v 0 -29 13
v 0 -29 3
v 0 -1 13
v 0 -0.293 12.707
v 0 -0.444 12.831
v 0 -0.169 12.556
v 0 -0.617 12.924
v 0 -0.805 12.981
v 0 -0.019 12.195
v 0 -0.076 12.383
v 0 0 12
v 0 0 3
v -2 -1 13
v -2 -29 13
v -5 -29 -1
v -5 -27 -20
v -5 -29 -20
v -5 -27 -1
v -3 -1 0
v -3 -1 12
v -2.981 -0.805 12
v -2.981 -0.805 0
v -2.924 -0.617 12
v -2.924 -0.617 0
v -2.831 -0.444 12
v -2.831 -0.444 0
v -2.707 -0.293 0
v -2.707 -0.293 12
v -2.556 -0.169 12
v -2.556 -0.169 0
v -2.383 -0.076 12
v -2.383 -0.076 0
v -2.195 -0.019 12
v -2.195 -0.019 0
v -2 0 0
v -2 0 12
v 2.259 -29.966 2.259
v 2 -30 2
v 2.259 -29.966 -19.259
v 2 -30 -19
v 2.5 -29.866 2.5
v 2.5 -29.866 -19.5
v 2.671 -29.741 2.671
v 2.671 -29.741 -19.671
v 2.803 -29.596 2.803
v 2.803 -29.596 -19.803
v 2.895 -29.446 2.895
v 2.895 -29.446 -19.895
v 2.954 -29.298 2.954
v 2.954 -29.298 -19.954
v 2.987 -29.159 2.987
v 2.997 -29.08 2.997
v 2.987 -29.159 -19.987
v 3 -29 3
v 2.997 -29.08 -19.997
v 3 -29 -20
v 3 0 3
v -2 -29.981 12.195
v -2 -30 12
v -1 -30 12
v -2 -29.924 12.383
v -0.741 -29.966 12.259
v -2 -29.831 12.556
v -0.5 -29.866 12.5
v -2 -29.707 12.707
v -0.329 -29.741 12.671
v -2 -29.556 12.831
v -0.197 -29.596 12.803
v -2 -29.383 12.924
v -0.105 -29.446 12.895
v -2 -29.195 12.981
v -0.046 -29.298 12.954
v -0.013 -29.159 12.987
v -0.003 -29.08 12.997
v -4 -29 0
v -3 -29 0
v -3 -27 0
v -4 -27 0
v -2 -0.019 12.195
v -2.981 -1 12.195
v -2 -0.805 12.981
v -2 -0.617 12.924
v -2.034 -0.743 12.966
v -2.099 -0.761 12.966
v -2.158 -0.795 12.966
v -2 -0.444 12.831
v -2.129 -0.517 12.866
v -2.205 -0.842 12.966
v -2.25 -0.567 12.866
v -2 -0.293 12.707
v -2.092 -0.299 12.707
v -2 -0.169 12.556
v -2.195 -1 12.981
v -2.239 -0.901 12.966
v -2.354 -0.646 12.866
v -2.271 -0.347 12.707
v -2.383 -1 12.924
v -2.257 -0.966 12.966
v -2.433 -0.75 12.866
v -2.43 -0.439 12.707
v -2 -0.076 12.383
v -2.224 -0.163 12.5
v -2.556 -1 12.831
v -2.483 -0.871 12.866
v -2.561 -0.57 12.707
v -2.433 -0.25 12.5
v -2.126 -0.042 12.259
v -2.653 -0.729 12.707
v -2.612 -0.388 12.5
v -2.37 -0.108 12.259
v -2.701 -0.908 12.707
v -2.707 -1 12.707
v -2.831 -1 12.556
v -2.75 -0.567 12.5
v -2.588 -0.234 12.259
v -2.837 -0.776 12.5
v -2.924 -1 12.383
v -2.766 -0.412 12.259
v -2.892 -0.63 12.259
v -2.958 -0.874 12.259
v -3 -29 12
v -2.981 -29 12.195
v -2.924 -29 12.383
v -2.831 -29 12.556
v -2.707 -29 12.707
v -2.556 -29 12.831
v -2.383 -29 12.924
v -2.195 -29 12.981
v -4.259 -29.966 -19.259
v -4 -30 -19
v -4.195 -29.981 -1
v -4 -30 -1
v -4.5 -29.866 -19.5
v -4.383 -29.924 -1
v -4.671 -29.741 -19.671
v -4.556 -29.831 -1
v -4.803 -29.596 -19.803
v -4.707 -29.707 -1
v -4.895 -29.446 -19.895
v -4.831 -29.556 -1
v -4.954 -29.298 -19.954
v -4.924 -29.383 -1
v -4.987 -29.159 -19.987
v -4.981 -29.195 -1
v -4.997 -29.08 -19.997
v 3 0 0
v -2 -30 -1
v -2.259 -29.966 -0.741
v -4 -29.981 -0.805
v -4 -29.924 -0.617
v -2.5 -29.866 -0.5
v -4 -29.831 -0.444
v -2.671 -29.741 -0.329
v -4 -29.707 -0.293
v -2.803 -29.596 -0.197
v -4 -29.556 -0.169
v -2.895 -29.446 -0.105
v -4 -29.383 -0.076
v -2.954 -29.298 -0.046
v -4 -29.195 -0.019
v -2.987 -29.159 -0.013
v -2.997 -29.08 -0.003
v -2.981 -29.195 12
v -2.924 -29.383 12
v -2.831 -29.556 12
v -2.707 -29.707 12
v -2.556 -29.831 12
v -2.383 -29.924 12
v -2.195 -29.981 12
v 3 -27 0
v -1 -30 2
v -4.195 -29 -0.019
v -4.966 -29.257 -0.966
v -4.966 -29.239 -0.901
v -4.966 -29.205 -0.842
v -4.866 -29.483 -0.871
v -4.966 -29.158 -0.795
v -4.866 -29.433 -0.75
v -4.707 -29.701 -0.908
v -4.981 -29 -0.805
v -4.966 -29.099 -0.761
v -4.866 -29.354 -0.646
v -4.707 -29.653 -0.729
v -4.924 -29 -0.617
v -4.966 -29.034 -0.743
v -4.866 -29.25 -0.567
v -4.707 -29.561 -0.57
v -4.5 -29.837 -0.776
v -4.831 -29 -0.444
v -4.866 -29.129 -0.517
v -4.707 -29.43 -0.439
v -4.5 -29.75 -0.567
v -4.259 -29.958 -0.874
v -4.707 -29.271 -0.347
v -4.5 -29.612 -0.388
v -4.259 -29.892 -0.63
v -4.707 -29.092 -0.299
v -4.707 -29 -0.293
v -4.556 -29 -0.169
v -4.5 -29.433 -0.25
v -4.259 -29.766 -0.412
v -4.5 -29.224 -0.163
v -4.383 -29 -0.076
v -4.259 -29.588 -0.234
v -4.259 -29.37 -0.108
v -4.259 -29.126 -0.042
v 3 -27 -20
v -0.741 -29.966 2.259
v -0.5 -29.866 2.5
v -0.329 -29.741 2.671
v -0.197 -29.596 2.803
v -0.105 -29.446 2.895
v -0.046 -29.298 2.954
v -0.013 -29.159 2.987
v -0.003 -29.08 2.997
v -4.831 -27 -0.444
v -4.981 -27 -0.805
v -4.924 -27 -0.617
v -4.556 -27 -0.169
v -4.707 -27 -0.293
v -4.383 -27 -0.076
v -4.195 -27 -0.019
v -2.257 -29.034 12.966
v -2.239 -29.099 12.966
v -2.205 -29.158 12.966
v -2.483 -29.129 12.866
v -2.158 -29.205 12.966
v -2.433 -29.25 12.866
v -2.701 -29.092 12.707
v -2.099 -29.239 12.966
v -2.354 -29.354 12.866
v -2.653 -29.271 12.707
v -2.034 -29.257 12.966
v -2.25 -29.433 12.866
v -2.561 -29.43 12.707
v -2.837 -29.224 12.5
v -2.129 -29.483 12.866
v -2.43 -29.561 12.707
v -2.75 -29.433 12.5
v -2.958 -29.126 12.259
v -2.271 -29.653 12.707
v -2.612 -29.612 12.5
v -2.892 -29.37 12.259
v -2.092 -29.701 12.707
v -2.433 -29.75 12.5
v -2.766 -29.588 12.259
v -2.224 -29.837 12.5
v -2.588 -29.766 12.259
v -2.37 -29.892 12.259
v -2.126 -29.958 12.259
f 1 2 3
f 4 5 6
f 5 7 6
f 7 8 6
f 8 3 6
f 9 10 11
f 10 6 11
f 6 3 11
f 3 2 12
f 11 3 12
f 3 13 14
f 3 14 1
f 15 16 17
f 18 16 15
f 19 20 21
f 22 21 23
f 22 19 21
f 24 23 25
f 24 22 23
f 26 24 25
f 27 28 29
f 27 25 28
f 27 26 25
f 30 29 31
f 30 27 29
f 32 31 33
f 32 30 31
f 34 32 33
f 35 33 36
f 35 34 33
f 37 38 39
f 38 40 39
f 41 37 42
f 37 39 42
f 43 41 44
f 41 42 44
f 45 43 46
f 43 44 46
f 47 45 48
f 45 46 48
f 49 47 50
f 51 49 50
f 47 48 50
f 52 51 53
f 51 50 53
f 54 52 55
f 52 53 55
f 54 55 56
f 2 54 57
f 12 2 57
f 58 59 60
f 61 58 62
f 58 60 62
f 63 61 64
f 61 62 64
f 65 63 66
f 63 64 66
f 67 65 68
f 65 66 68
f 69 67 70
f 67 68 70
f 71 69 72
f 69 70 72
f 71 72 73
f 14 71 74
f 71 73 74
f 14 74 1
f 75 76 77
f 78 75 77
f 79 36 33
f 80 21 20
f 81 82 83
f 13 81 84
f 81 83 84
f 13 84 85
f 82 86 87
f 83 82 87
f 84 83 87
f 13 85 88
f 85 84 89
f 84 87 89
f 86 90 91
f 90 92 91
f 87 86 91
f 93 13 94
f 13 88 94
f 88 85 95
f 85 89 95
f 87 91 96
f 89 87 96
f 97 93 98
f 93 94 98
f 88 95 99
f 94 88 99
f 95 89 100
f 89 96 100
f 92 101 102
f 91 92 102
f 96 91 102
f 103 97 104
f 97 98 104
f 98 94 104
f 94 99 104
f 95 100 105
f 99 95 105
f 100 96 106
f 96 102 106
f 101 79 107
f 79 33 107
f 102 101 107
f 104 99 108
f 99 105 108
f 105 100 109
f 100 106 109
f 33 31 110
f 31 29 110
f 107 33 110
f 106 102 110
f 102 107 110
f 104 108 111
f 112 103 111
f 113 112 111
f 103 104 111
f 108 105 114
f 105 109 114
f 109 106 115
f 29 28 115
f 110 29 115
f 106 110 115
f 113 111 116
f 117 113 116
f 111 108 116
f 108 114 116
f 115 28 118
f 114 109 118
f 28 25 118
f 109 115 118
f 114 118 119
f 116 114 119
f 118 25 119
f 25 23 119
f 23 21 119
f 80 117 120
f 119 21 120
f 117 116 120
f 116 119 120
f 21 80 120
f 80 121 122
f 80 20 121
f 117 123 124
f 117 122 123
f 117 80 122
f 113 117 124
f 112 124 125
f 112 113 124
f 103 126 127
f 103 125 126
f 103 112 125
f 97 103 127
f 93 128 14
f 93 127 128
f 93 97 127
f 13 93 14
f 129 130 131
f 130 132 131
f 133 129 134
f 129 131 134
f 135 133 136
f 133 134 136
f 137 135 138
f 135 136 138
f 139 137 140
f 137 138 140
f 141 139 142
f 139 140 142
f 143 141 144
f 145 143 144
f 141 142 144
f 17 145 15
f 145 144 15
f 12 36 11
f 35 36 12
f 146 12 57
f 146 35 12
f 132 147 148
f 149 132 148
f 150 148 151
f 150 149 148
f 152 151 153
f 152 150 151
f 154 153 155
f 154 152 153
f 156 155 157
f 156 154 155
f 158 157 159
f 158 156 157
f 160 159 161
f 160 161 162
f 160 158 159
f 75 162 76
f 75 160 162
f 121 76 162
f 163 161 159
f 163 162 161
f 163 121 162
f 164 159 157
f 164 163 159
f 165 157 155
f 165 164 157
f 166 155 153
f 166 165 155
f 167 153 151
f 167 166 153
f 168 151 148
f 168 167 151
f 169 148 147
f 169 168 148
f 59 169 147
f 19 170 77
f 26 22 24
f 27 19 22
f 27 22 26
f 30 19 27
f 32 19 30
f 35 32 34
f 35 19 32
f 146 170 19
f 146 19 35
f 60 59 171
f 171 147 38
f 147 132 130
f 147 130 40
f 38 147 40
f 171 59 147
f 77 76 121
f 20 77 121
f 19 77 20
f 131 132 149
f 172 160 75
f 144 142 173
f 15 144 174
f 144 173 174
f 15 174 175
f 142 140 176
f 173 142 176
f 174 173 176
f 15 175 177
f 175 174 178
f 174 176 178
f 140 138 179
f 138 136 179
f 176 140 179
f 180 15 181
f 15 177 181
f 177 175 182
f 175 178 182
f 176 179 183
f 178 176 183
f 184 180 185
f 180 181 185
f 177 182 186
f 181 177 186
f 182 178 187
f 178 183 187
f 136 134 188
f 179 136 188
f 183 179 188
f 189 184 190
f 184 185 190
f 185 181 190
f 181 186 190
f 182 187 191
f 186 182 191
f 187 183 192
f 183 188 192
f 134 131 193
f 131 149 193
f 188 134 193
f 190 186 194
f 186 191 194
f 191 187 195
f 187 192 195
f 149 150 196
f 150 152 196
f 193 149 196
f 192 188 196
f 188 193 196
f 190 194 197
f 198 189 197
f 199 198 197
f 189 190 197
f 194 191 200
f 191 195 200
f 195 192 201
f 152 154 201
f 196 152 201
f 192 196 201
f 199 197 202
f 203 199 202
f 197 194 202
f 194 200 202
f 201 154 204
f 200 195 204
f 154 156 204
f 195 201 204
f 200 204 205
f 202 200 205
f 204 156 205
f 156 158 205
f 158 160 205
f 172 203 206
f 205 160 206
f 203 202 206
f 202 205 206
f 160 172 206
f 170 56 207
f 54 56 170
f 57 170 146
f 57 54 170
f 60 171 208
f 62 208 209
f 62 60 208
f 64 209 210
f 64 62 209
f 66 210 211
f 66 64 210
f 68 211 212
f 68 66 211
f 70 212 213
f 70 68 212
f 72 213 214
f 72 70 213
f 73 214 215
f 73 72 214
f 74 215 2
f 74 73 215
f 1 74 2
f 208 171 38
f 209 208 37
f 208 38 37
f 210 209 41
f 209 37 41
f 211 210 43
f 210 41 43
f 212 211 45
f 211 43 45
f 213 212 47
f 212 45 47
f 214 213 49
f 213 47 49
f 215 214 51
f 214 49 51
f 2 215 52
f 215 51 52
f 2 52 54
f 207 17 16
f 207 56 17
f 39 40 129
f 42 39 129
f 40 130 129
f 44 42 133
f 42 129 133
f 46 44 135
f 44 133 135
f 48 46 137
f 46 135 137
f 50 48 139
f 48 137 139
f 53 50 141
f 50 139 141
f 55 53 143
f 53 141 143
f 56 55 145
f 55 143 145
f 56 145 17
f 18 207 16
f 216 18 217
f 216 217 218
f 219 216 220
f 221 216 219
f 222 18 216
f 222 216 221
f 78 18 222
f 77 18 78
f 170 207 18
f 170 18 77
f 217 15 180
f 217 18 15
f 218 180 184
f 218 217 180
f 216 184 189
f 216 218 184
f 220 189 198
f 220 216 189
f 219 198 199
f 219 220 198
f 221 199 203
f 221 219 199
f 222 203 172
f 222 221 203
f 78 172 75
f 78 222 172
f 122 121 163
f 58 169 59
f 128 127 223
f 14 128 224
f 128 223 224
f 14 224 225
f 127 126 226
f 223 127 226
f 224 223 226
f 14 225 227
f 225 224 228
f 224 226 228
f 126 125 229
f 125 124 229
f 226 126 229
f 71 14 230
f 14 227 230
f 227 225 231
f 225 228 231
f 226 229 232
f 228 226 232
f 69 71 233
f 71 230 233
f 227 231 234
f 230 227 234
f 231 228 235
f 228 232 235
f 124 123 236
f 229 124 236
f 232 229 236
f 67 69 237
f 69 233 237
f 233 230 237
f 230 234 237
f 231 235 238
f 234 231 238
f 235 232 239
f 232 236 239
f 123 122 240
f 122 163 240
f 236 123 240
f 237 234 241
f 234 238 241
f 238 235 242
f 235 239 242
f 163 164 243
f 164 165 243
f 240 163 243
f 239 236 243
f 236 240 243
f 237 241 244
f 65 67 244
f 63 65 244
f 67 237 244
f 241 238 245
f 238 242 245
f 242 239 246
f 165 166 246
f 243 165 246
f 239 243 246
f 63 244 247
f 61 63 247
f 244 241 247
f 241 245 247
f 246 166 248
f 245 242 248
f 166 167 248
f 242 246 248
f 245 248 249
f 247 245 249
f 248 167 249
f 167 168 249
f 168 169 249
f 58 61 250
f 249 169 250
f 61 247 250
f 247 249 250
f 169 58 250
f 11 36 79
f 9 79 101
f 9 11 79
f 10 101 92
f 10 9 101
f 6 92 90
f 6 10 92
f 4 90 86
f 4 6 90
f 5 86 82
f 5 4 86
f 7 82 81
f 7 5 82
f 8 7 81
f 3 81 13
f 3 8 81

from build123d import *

# Parameters (mm, degrees)
SKETCH1_W            = 3
SKETCH1_H            = 30
BOSS_EXTRUDE1_DEPTH  = 3
SKETCH8_W            = 3
SKETCH8_H            = 3
BOSS_EXTRUDE7_DEPTH  = 20
SKETCH9_W            = 20
SKETCH9_H            = 3
BOSS_EXTRUDE8_DEPTH  = 5
SKETCH12_W           = 3
SKETCH12_H           = 30
BOSS_EXTRUDE10_DEPTH = 3
SKETCH13_W           = 3
SKETCH13_H           = 30
BOSS_EXTRUDE11_DEPTH = 10
FILLET6_R            = 1


with BuildPart() as part:
    # Sketch1 → Boss-Extrude1 (new body)
    with BuildSketch(Plane.XY):
        with Locations((1.5, -15)):
            Rectangle(SKETCH1_W, SKETCH1_H)
    extrude(amount=BOSS_EXTRUDE1_DEPTH)

    # Sketch8 → Boss-Extrude7 (add)
    with BuildSketch(Plane(origin=(0, 0, 0), x_dir=(-1, 0, 0), z_dir=(0, 0, -1))):
        with Locations((-1.5, -28.5)):
            Rectangle(SKETCH8_W, SKETCH8_H)
    extrude(amount=BOSS_EXTRUDE7_DEPTH)

    # Sketch9 → Boss-Extrude8 (add)
    with BuildSketch(Plane.ZY):
        with Locations((-10, -28.5)):
            Rectangle(SKETCH9_W, SKETCH9_H)
    extrude(amount=BOSS_EXTRUDE8_DEPTH)

    # Sketch12 → Boss-Extrude10 (add)
    with BuildSketch(Plane.ZY):
        with Locations((1.5, -15)):
            Rectangle(SKETCH12_W, SKETCH12_H)
    extrude(amount=BOSS_EXTRUDE10_DEPTH)

    # Sketch13 → Boss-Extrude11 (add)
    with BuildSketch(Plane.XY.offset(3)):
        with Locations((-1.5, -15)):
            Rectangle(SKETCH13_W, SKETCH13_H)
    extrude(amount=BOSS_EXTRUDE11_DEPTH)

    # Fillet6
    fillet6_edges = [part.edges().sort_by_distance(p)[0] for p in [
        (-1, -30, -20),
        (-4, -30, 0),
        (-5, -30, -10),
        (-5, -28.5, 0),
        (-3, 0, 6.5),
        (-3, -30, 6.5),
        (1.5, -30, 3),
        (0, -30, 8),
        (-1.5, 0, 13),
        (-3, -15, 13),
        (-1.5, -30, 13),
        (3, -30, -8.5),
    ]]
    fillet(fillet6_edges, radius=FILLET6_R)


solid = part.part
